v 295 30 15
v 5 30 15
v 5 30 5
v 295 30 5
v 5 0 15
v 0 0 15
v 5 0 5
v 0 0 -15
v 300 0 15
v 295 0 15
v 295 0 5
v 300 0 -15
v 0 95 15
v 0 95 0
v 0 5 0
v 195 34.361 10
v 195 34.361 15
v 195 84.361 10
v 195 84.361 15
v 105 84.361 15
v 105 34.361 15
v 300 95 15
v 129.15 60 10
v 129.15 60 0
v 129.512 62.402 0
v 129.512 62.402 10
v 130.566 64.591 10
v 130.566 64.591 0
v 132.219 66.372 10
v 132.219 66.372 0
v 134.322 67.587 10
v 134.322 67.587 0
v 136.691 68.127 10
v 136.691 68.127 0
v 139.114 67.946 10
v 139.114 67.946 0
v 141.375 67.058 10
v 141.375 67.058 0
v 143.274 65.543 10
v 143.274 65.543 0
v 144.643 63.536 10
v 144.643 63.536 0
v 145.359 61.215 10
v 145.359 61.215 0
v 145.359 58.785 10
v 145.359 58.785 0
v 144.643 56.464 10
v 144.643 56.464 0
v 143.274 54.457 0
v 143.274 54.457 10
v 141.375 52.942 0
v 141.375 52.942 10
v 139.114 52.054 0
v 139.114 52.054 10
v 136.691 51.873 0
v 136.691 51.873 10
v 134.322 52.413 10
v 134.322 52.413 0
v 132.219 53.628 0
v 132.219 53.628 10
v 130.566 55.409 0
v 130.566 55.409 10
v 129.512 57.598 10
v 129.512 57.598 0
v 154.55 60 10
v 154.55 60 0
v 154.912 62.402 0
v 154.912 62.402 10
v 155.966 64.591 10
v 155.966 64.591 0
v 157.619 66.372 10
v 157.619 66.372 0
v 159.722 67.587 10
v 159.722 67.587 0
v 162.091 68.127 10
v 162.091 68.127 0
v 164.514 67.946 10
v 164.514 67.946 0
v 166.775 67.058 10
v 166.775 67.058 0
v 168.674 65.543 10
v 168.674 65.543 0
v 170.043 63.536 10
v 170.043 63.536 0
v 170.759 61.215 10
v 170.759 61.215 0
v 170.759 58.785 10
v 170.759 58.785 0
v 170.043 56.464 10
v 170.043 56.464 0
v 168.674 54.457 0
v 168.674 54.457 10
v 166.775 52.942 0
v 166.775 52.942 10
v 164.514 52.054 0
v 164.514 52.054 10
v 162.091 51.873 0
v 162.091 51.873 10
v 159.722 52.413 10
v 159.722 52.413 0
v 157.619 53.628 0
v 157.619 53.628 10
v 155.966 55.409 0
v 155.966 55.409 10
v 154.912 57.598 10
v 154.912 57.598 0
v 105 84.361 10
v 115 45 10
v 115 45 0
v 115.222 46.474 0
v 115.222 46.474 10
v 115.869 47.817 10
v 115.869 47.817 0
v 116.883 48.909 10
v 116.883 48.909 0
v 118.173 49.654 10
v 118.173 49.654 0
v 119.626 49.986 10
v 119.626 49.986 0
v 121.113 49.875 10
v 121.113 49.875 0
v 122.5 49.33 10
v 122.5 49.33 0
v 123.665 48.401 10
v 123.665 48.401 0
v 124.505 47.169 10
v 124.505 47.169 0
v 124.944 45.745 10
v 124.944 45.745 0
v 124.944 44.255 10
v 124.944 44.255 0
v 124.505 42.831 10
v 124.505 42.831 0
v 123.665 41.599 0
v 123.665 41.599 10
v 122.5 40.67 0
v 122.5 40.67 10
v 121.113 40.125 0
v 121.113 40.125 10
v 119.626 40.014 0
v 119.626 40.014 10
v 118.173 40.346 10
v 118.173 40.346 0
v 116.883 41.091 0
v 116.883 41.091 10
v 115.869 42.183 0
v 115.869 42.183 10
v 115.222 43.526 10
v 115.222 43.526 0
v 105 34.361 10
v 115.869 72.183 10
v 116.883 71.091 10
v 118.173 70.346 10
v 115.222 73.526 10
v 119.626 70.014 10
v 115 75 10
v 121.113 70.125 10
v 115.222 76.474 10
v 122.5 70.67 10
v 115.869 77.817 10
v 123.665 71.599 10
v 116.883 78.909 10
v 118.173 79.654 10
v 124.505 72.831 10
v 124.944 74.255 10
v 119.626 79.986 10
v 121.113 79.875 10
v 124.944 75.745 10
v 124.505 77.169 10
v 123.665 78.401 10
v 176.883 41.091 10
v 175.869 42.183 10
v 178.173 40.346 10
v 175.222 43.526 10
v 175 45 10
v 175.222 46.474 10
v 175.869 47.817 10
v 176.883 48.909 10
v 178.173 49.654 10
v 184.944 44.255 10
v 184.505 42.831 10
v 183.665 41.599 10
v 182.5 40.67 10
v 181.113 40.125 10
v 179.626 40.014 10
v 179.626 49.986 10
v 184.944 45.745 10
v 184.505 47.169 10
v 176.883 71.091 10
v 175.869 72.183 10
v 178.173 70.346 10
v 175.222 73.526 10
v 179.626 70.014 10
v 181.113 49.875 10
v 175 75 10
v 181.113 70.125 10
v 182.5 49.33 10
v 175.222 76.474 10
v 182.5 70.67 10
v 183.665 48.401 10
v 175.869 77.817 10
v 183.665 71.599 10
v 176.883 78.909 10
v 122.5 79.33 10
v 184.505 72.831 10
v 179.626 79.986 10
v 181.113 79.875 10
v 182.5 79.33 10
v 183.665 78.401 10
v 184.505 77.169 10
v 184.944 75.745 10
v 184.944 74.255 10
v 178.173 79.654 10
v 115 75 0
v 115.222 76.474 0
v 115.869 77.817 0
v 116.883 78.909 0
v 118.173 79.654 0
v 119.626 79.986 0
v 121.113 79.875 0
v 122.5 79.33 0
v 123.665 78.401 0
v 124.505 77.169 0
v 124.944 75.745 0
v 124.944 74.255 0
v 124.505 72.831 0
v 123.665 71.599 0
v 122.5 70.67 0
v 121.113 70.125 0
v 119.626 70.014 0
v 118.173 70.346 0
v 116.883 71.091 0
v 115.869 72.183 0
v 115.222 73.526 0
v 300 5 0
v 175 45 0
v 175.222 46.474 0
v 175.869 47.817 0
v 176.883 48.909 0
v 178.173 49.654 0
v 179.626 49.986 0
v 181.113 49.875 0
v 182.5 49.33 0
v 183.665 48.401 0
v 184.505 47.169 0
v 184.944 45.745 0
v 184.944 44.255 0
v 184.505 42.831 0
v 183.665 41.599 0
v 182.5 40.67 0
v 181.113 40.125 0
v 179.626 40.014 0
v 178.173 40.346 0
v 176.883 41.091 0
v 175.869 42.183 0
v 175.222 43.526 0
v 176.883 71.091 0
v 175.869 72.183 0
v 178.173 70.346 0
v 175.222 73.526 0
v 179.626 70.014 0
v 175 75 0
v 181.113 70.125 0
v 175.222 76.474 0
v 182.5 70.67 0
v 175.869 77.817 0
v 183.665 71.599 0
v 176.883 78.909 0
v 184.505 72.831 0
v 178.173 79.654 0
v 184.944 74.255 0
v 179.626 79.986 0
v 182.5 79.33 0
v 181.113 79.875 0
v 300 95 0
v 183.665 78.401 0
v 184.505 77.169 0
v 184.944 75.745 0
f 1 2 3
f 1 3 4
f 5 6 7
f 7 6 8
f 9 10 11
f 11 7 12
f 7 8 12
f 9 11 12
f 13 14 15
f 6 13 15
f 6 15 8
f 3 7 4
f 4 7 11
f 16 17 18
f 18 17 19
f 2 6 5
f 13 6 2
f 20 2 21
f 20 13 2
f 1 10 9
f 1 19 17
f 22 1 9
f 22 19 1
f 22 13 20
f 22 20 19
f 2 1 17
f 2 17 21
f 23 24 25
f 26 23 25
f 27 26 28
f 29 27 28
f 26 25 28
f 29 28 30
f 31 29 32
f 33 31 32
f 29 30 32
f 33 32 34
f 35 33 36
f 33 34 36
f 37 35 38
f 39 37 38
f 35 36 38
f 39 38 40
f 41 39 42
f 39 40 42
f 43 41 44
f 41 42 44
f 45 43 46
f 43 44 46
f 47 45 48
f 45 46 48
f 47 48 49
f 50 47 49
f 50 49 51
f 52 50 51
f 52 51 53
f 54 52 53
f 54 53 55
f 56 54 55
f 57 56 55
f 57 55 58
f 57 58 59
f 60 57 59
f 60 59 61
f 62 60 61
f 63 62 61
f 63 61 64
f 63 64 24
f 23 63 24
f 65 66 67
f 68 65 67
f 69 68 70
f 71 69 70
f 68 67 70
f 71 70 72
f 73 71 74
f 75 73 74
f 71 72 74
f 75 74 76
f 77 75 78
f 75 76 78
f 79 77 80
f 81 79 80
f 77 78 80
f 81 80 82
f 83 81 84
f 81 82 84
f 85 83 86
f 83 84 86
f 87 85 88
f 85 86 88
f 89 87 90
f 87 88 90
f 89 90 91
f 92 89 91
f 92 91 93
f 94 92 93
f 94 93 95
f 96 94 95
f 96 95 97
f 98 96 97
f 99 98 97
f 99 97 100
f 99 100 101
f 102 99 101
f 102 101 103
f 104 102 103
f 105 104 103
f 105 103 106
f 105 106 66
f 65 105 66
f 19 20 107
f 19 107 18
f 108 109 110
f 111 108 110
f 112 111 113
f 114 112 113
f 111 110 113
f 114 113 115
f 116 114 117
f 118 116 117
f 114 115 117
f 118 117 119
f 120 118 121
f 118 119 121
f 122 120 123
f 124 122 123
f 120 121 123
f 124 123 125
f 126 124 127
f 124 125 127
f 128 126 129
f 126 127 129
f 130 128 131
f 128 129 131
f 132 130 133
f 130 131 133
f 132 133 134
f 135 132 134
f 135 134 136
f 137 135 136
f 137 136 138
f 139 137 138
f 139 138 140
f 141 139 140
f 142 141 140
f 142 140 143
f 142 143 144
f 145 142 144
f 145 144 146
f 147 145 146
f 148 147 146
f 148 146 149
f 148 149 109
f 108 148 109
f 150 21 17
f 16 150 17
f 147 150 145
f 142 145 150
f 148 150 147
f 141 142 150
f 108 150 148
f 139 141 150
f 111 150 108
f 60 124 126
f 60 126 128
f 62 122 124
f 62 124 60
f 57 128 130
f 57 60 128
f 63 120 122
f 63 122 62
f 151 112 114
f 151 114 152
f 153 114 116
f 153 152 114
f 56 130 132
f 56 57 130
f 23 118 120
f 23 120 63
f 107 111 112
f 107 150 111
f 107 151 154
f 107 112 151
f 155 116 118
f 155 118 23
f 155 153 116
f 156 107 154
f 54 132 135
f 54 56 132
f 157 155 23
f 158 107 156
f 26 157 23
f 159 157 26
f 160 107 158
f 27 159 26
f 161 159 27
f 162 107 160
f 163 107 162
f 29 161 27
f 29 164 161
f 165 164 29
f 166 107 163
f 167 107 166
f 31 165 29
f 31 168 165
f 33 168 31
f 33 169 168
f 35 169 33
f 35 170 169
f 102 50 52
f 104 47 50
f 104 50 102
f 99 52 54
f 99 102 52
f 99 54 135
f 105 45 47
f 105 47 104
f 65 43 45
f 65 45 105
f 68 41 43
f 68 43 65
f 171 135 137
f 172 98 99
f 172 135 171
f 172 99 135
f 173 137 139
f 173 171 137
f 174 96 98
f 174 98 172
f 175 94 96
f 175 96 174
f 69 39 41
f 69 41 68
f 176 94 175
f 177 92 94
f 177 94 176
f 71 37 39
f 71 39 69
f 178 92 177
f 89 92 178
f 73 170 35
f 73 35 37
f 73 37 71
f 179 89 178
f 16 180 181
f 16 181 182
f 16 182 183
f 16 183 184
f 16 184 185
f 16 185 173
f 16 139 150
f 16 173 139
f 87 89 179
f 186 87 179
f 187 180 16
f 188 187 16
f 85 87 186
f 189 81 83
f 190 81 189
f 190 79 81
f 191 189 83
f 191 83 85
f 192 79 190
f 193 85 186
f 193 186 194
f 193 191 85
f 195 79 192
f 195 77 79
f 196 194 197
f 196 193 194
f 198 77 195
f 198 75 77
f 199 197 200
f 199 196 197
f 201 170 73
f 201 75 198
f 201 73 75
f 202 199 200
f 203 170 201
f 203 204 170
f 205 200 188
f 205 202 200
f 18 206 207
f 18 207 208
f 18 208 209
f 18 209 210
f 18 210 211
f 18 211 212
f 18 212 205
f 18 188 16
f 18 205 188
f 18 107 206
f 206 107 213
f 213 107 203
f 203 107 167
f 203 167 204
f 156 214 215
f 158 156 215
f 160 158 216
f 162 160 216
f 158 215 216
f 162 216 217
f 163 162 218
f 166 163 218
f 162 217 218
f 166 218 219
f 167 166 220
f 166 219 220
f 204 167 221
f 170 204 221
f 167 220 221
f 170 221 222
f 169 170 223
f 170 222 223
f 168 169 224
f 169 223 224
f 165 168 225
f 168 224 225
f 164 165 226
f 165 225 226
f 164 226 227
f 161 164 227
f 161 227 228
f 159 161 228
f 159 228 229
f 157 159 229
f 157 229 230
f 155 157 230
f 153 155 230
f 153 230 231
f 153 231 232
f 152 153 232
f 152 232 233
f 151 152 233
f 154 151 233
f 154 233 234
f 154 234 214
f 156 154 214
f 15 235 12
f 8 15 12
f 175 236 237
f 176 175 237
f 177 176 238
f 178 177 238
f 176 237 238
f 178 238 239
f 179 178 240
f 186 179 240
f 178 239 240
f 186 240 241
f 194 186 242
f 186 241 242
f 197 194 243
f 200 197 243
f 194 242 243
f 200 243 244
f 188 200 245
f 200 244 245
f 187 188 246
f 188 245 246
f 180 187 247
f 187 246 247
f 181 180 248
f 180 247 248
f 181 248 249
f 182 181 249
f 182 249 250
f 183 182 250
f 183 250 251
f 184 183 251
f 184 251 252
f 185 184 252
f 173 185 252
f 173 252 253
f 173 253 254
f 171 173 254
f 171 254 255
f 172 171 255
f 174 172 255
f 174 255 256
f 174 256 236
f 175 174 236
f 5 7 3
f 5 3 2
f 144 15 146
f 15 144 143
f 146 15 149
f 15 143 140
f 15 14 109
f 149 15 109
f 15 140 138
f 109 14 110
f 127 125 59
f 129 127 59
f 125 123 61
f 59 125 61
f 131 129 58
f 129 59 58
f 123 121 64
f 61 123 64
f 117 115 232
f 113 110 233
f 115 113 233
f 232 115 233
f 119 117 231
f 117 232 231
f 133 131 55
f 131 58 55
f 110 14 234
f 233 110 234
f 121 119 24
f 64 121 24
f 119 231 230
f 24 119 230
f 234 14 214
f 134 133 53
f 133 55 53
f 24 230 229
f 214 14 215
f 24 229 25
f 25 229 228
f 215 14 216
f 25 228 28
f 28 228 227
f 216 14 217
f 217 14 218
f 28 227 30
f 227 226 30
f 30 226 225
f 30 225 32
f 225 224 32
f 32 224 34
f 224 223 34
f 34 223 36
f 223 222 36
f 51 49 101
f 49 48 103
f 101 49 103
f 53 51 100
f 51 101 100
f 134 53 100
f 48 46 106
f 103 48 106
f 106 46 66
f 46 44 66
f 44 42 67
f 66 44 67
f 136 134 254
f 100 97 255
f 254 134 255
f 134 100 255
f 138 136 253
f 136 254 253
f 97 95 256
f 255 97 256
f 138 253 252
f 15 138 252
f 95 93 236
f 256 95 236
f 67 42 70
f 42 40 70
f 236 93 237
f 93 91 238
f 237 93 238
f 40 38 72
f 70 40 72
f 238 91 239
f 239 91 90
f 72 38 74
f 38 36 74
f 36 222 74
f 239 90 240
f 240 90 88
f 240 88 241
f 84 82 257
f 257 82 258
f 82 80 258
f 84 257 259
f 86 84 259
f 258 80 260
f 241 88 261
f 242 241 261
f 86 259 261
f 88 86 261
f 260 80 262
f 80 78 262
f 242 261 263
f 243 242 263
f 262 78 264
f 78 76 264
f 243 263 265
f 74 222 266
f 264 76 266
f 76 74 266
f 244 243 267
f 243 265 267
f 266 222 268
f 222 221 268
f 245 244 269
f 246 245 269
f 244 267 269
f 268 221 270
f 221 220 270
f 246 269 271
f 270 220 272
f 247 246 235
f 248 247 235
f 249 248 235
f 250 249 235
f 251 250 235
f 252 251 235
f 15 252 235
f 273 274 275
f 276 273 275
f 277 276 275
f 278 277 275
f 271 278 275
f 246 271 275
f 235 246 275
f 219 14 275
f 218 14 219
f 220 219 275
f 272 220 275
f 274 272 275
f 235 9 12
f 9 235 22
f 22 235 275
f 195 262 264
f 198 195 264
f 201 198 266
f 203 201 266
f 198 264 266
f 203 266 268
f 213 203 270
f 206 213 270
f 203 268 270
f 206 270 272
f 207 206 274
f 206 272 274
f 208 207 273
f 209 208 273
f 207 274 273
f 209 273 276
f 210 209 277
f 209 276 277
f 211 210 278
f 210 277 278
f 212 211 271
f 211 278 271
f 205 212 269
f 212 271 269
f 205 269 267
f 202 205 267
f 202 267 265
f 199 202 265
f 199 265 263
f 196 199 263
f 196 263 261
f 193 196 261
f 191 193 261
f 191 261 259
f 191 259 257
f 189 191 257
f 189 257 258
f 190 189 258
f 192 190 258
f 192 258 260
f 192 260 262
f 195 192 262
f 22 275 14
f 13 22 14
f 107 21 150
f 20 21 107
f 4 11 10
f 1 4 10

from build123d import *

# Parameters (mm, degrees)
ESQUISSE1_W             = 300
ESQUISSE1_H             = 95
BOSS_EXTRU_1_DEPTH      = 5
BOSS_EXTRU_2_DEPTH      = 300
BOSS_EXTRU_3_DEPTH      = 10
ESQUISSE6_R             = 8.15
ESQUISSE6_R_2           = 5
ENL_V_MAT_EXTRU_2_DEPTH = 16
ESQUISSE7_W             = 290
ESQUISSE7_H             = 23.020862504
ENL_V_MAT_EXTRU_3_DEPTH = 30
ESQUISSE9_W             = 90
ESQUISSE9_H             = 50
ENL_V_MAT_EXTRU_4_DEPTH = 5


with BuildPart() as part:
    # Esquisse1 → Boss.-Extru.1 (new body)
    with BuildSketch(Plane.XY):
        with Locations((150, 47.5)):
            Rectangle(ESQUISSE1_W, ESQUISSE1_H)
    extrude(amount=BOSS_EXTRU_1_DEPTH)

    # Esquisse3 → Boss.-Extru.2 (add)
    with BuildSketch(Plane.ZY):
        Polygon((-15, 0), (0, 0), (0, 5), align=None)
    extrude(amount=-BOSS_EXTRU_2_DEPTH)

    # Esquisse5 → Boss.-Extru.3 (add)
    with BuildSketch(Plane.XY.offset(5)):
        Polygon((195, 95), (105, 95), (0, 95), (0, 30), (0, 0), (300, 0), (300, 30), (300, 95), align=None)
    extrude(amount=BOSS_EXTRU_3_DEPTH)

    # Esquisse6 → Enlèv. mat.-Extru.2 (cut, through all)
    with BuildSketch(Plane(origin=(0, 0, 0), x_dir=(-1, 0, 0), z_dir=(0, 0, -1))):
        with Locations((-162.7, 60)):
            Circle(ESQUISSE6_R)
        with Locations((-137.3, 60)):
            Circle(ESQUISSE6_R)
        with Locations((-180, 75)):
            Circle(ESQUISSE6_R_2)
        with Locations((-180, 45)):
            Circle(ESQUISSE6_R_2)
        with Locations((-120, 75)):
            Circle(ESQUISSE6_R_2)
        with Locations((-120, 45)):
            Circle(ESQUISSE6_R_2)
    extrude(amount=-ENL_V_MAT_EXTRU_2_DEPTH, mode=Mode.SUBTRACT)

    # Esquisse7 → Enlèv. mat.-Extru.3 (cut)
    with BuildSketch(Plane.XZ):
        with Locations((150, 16.510431252)):
            Rectangle(ESQUISSE7_W, ESQUISSE7_H)
    extrude(amount=-ENL_V_MAT_EXTRU_3_DEPTH, mode=Mode.SUBTRACT)

    # Esquisse9 → Enlèv. mat.-Extru.4 (cut)
    with BuildSketch(Plane.XY.offset(15)):
        with Locations((150, 59.36084713)):
            Rectangle(ESQUISSE9_W, ESQUISSE9_H)
    extrude(amount=-ENL_V_MAT_EXTRU_4_DEPTH, mode=Mode.SUBTRACT)


solid = part.part
